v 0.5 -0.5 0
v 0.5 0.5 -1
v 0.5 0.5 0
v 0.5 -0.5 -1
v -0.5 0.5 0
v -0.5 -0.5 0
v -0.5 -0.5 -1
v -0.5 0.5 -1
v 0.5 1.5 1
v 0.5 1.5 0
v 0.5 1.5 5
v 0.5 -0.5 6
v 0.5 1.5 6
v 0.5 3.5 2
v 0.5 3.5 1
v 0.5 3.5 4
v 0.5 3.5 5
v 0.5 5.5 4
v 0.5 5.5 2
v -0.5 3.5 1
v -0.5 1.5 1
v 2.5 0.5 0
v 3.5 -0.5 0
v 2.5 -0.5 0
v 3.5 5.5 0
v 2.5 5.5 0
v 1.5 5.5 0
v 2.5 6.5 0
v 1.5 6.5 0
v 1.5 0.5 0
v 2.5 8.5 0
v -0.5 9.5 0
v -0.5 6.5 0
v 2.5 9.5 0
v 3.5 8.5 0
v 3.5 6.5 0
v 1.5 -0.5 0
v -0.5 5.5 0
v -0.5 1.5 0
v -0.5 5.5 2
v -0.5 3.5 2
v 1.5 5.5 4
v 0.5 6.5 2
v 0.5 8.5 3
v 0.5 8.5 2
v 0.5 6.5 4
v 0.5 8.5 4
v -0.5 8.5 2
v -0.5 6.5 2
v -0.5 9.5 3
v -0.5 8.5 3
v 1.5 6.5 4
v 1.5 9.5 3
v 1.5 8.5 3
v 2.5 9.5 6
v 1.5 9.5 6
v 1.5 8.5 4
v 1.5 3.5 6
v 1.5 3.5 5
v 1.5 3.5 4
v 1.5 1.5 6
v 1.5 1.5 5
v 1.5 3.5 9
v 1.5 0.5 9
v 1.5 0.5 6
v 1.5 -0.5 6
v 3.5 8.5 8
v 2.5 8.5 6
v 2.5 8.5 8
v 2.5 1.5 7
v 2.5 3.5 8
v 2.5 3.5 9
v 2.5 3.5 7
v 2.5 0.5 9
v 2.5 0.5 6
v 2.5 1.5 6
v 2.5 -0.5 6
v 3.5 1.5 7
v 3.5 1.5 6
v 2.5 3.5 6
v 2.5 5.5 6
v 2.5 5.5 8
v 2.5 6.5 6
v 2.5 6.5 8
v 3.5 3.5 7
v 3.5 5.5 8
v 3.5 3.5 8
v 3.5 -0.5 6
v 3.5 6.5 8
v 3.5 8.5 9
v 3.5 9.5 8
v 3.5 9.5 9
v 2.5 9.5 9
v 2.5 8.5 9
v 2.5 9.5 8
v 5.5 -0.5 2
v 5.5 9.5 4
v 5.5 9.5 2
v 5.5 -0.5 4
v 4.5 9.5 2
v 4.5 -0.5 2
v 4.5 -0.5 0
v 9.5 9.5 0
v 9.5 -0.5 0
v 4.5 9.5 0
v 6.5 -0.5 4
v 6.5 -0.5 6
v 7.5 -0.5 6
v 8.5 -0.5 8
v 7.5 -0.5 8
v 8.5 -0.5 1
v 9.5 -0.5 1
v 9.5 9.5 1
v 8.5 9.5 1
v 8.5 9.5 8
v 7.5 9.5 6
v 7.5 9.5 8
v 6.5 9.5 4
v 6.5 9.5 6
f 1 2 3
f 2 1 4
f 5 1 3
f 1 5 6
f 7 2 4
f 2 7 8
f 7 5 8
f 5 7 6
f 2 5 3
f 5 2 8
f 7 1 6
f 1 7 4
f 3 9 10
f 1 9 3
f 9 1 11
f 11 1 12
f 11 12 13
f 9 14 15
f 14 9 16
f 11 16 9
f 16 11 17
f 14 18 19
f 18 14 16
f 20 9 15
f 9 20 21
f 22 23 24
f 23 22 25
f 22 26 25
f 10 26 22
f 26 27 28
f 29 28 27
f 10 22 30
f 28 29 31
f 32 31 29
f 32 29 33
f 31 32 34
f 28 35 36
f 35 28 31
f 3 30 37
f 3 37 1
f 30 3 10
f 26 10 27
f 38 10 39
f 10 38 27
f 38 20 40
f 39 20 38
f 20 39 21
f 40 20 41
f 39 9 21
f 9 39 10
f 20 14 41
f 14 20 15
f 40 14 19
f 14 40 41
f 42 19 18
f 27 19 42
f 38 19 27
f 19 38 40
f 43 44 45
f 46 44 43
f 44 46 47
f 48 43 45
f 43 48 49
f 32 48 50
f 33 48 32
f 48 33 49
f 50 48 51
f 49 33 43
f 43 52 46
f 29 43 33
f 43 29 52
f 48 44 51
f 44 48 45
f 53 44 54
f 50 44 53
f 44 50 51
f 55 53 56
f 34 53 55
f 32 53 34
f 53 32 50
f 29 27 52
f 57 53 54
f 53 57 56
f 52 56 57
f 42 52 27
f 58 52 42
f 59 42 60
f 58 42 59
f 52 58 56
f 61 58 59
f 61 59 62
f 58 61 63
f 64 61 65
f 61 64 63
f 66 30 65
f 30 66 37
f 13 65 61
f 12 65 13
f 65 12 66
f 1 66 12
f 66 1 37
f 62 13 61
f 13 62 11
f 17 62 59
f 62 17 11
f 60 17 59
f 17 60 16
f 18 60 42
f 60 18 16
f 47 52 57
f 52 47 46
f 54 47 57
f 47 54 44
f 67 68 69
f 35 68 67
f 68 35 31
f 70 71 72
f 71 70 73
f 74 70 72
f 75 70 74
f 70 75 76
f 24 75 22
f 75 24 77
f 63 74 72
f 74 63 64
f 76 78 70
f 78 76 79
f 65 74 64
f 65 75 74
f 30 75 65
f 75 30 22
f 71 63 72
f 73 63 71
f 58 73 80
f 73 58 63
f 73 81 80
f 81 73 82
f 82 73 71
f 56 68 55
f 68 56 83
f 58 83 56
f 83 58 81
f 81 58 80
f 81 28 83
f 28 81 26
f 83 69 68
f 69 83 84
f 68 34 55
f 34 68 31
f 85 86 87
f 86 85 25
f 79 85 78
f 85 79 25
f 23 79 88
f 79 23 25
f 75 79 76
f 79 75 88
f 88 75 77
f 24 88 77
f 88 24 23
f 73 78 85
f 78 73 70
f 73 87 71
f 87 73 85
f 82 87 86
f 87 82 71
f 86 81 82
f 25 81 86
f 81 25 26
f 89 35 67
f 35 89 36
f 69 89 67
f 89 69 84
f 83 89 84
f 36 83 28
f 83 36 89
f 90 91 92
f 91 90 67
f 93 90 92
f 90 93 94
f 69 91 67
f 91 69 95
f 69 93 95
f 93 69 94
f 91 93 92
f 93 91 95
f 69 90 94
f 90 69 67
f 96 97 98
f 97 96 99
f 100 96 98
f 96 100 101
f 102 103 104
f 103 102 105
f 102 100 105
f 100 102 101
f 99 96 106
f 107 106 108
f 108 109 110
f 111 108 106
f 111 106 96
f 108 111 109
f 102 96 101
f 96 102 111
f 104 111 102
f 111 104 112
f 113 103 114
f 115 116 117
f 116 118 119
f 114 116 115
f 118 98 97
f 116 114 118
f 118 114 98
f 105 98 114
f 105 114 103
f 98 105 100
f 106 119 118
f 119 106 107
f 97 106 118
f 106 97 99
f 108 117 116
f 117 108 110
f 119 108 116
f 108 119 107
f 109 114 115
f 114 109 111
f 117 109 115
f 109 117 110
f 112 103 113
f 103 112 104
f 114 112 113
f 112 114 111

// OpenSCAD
union() {
    translate([0, 0, -0.5]) color([1, 0, 0]) cube([1, 1, 1], center=true);
    translate([0, 2, 0.5]) cube([1, 1, 1], center=true);
    translate([0, 3, 0.5]) cube([1, 1, 1], center=true);
    translate([0, 4, 1.0]) cube([1, 1, 2], center=true);
    translate([0, 5, 1.0]) cube([1, 1, 2], center=true);
    translate([0, 7, 1.0]) cube([1, 1, 2], center=true);
    translate([0, 8, 1.0]) cube([1, 1, 2], center=true);
    translate([0, 9, 1.5]) cube([1, 1, 3], center=true);
    translate([1, 0, 3.0]) cube([1, 1, 6], center=true);
    translate([1, 1, 3.0]) cube([1, 1, 6], center=true);
    translate([1, 2, 2.5]) cube([1, 1, 5], center=true);
    translate([1, 3, 2.5]) cube([1, 1, 5], center=true);
    translate([1, 4, 2.0]) cube([1, 1, 4], center=true);
    translate([1, 5, 2.0]) cube([1, 1, 4], center=true);
    translate([1, 7, 2.0]) cube([1, 1, 4], center=true);
    translate([1, 8, 2.0]) cube([1, 1, 4], center=true);
    translate([1, 9, 1.5]) cube([1, 1, 3], center=true);
    translate([2, 1, 4.5]) cube([1, 1, 9], center=true);
    translate([2, 2, 4.5]) cube([1, 1, 9], center=true);
    translate([2, 3, 4.5]) cube([1, 1, 9], center=true);
    translate([2, 4, 3.0]) cube([1, 1, 6], center=true);
    translate([2, 5, 3.0]) cube([1, 1, 6], center=true);
    translate([2, 6, 3.0]) cube([1, 1, 6], center=true);
    translate([2, 7, 3.0]) cube([1, 1, 6], center=true);
    translate([2, 8, 3.0]) cube([1, 1, 6], center=true);
    translate([2, 9, 3.0]) cube([1, 1, 6], center=true);
    translate([3, 0, 3.0]) cube([1, 1, 6], center=true);
    translate([3, 1, 3.0]) cube([1, 1, 6], center=true);
    translate([3, 2, 3.5]) cube([1, 1, 7], center=true);
    translate([3, 3, 3.5]) cube([1, 1, 7], center=true);
    translate([3, 4, 4.0]) cube([1, 1, 8], center=true);
    translate([3, 5, 4.0]) cube([1, 1, 8], center=true);
    translate([3, 7, 4.0]) cube([1, 1, 8], center=true);
    translate([3, 8, 4.0]) cube([1, 1, 8], center=true);
    translate([3, 9, 8.5]) color([0, 0, 1]) cube([1, 1, 1], center=true);
    translate([5, 0, 1.0]) cube([1, 1, 2], center=true);
    translate([5, 1, 1.0]) cube([1, 1, 2], center=true);
    translate([5, 2, 1.0]) cube([1, 1, 2], center=true);
    translate([5, 3, 1.0]) cube([1, 1, 2], center=true);
    translate([5, 4, 1.0]) cube([1, 1, 2], center=true);
    translate([5, 5, 1.0]) cube([1, 1, 2], center=true);
    translate([5, 6, 1.0]) cube([1, 1, 2], center=true);
    translate([5, 7, 1.0]) cube([1, 1, 2], center=true);
    translate([5, 8, 1.0]) cube([1, 1, 2], center=true);
    translate([5, 9, 1.0]) cube([1, 1, 2], center=true);
    translate([6, 0, 2.0]) cube([1, 1, 4], center=true);
    translate([6, 1, 2.0]) cube([1, 1, 4], center=true);
    translate([6, 2, 2.0]) cube([1, 1, 4], center=true);
    translate([6, 3, 2.0]) cube([1, 1, 4], center=true);
    translate([6, 4, 2.0]) cube([1, 1, 4], center=true);
    translate([6, 5, 2.0]) cube([1, 1, 4], center=true);
    translate([6, 6, 2.0]) cube([1, 1, 4], center=true);
    translate([6, 7, 2.0]) cube([1, 1, 4], center=true);
    translate([6, 8, 2.0]) cube([1, 1, 4], center=true);
    translate([6, 9, 2.0]) cube([1, 1, 4], center=true);
    translate([7, 0, 3.0]) cube([1, 1, 6], center=true);
    translate([7, 1, 3.0]) cube([1, 1, 6], center=true);
    translate([7, 2, 3.0]) cube([1, 1, 6], center=true);
    translate([7, 3, 3.0]) cube([1, 1, 6], center=true);
    translate([7, 4, 3.0]) cube([1, 1, 6], center=true);
    translate([7, 5, 3.0]) cube([1, 1, 6], center=true);
    translate([7, 6, 3.0]) cube([1, 1, 6], center=true);
    translate([7, 7, 3.0]) cube([1, 1, 6], center=true);
    translate([7, 8, 3.0]) cube([1, 1, 6], center=true);
    translate([7, 9, 3.0]) cube([1, 1, 6], center=true);
    translate([8, 0, 4.0]) cube([1, 1, 8], center=true);
    translate([8, 1, 4.0]) cube([1, 1, 8], center=true);
    translate([8, 2, 4.0]) cube([1, 1, 8], center=true);
    translate([8, 3, 4.0]) cube([1, 1, 8], center=true);
    translate([8, 4, 4.0]) cube([1, 1, 8], center=true);
    translate([8, 5, 4.0]) cube([1, 1, 8], center=true);
    translate([8, 6, 4.0]) cube([1, 1, 8], center=true);
    translate([8, 7, 4.0]) cube([1, 1, 8], center=true);
    translate([8, 8, 4.0]) cube([1, 1, 8], center=true);
    translate([8, 9, 4.0]) cube([1, 1, 8], center=true);
    translate([9, 0, 0.5]) cube([1, 1, 1], center=true);
    translate([9, 1, 0.5]) cube([1, 1, 1], center=true);
    translate([9, 2, 0.5]) cube([1, 1, 1], center=true);
    translate([9, 3, 0.5]) cube([1, 1, 1], center=true);
    translate([9, 4, 0.5]) cube([1, 1, 1], center=true);
    translate([9, 5, 0.5]) cube([1, 1, 1], center=true);
    translate([9, 6, 0.5]) cube([1, 1, 1], center=true);
    translate([9, 7, 0.5]) cube([1, 1, 1], center=true);
    translate([9, 8, 0.5]) cube([1, 1, 1], center=true);
    translate([9, 9, 0.5]) cube([1, 1, 1], center=true);
}
